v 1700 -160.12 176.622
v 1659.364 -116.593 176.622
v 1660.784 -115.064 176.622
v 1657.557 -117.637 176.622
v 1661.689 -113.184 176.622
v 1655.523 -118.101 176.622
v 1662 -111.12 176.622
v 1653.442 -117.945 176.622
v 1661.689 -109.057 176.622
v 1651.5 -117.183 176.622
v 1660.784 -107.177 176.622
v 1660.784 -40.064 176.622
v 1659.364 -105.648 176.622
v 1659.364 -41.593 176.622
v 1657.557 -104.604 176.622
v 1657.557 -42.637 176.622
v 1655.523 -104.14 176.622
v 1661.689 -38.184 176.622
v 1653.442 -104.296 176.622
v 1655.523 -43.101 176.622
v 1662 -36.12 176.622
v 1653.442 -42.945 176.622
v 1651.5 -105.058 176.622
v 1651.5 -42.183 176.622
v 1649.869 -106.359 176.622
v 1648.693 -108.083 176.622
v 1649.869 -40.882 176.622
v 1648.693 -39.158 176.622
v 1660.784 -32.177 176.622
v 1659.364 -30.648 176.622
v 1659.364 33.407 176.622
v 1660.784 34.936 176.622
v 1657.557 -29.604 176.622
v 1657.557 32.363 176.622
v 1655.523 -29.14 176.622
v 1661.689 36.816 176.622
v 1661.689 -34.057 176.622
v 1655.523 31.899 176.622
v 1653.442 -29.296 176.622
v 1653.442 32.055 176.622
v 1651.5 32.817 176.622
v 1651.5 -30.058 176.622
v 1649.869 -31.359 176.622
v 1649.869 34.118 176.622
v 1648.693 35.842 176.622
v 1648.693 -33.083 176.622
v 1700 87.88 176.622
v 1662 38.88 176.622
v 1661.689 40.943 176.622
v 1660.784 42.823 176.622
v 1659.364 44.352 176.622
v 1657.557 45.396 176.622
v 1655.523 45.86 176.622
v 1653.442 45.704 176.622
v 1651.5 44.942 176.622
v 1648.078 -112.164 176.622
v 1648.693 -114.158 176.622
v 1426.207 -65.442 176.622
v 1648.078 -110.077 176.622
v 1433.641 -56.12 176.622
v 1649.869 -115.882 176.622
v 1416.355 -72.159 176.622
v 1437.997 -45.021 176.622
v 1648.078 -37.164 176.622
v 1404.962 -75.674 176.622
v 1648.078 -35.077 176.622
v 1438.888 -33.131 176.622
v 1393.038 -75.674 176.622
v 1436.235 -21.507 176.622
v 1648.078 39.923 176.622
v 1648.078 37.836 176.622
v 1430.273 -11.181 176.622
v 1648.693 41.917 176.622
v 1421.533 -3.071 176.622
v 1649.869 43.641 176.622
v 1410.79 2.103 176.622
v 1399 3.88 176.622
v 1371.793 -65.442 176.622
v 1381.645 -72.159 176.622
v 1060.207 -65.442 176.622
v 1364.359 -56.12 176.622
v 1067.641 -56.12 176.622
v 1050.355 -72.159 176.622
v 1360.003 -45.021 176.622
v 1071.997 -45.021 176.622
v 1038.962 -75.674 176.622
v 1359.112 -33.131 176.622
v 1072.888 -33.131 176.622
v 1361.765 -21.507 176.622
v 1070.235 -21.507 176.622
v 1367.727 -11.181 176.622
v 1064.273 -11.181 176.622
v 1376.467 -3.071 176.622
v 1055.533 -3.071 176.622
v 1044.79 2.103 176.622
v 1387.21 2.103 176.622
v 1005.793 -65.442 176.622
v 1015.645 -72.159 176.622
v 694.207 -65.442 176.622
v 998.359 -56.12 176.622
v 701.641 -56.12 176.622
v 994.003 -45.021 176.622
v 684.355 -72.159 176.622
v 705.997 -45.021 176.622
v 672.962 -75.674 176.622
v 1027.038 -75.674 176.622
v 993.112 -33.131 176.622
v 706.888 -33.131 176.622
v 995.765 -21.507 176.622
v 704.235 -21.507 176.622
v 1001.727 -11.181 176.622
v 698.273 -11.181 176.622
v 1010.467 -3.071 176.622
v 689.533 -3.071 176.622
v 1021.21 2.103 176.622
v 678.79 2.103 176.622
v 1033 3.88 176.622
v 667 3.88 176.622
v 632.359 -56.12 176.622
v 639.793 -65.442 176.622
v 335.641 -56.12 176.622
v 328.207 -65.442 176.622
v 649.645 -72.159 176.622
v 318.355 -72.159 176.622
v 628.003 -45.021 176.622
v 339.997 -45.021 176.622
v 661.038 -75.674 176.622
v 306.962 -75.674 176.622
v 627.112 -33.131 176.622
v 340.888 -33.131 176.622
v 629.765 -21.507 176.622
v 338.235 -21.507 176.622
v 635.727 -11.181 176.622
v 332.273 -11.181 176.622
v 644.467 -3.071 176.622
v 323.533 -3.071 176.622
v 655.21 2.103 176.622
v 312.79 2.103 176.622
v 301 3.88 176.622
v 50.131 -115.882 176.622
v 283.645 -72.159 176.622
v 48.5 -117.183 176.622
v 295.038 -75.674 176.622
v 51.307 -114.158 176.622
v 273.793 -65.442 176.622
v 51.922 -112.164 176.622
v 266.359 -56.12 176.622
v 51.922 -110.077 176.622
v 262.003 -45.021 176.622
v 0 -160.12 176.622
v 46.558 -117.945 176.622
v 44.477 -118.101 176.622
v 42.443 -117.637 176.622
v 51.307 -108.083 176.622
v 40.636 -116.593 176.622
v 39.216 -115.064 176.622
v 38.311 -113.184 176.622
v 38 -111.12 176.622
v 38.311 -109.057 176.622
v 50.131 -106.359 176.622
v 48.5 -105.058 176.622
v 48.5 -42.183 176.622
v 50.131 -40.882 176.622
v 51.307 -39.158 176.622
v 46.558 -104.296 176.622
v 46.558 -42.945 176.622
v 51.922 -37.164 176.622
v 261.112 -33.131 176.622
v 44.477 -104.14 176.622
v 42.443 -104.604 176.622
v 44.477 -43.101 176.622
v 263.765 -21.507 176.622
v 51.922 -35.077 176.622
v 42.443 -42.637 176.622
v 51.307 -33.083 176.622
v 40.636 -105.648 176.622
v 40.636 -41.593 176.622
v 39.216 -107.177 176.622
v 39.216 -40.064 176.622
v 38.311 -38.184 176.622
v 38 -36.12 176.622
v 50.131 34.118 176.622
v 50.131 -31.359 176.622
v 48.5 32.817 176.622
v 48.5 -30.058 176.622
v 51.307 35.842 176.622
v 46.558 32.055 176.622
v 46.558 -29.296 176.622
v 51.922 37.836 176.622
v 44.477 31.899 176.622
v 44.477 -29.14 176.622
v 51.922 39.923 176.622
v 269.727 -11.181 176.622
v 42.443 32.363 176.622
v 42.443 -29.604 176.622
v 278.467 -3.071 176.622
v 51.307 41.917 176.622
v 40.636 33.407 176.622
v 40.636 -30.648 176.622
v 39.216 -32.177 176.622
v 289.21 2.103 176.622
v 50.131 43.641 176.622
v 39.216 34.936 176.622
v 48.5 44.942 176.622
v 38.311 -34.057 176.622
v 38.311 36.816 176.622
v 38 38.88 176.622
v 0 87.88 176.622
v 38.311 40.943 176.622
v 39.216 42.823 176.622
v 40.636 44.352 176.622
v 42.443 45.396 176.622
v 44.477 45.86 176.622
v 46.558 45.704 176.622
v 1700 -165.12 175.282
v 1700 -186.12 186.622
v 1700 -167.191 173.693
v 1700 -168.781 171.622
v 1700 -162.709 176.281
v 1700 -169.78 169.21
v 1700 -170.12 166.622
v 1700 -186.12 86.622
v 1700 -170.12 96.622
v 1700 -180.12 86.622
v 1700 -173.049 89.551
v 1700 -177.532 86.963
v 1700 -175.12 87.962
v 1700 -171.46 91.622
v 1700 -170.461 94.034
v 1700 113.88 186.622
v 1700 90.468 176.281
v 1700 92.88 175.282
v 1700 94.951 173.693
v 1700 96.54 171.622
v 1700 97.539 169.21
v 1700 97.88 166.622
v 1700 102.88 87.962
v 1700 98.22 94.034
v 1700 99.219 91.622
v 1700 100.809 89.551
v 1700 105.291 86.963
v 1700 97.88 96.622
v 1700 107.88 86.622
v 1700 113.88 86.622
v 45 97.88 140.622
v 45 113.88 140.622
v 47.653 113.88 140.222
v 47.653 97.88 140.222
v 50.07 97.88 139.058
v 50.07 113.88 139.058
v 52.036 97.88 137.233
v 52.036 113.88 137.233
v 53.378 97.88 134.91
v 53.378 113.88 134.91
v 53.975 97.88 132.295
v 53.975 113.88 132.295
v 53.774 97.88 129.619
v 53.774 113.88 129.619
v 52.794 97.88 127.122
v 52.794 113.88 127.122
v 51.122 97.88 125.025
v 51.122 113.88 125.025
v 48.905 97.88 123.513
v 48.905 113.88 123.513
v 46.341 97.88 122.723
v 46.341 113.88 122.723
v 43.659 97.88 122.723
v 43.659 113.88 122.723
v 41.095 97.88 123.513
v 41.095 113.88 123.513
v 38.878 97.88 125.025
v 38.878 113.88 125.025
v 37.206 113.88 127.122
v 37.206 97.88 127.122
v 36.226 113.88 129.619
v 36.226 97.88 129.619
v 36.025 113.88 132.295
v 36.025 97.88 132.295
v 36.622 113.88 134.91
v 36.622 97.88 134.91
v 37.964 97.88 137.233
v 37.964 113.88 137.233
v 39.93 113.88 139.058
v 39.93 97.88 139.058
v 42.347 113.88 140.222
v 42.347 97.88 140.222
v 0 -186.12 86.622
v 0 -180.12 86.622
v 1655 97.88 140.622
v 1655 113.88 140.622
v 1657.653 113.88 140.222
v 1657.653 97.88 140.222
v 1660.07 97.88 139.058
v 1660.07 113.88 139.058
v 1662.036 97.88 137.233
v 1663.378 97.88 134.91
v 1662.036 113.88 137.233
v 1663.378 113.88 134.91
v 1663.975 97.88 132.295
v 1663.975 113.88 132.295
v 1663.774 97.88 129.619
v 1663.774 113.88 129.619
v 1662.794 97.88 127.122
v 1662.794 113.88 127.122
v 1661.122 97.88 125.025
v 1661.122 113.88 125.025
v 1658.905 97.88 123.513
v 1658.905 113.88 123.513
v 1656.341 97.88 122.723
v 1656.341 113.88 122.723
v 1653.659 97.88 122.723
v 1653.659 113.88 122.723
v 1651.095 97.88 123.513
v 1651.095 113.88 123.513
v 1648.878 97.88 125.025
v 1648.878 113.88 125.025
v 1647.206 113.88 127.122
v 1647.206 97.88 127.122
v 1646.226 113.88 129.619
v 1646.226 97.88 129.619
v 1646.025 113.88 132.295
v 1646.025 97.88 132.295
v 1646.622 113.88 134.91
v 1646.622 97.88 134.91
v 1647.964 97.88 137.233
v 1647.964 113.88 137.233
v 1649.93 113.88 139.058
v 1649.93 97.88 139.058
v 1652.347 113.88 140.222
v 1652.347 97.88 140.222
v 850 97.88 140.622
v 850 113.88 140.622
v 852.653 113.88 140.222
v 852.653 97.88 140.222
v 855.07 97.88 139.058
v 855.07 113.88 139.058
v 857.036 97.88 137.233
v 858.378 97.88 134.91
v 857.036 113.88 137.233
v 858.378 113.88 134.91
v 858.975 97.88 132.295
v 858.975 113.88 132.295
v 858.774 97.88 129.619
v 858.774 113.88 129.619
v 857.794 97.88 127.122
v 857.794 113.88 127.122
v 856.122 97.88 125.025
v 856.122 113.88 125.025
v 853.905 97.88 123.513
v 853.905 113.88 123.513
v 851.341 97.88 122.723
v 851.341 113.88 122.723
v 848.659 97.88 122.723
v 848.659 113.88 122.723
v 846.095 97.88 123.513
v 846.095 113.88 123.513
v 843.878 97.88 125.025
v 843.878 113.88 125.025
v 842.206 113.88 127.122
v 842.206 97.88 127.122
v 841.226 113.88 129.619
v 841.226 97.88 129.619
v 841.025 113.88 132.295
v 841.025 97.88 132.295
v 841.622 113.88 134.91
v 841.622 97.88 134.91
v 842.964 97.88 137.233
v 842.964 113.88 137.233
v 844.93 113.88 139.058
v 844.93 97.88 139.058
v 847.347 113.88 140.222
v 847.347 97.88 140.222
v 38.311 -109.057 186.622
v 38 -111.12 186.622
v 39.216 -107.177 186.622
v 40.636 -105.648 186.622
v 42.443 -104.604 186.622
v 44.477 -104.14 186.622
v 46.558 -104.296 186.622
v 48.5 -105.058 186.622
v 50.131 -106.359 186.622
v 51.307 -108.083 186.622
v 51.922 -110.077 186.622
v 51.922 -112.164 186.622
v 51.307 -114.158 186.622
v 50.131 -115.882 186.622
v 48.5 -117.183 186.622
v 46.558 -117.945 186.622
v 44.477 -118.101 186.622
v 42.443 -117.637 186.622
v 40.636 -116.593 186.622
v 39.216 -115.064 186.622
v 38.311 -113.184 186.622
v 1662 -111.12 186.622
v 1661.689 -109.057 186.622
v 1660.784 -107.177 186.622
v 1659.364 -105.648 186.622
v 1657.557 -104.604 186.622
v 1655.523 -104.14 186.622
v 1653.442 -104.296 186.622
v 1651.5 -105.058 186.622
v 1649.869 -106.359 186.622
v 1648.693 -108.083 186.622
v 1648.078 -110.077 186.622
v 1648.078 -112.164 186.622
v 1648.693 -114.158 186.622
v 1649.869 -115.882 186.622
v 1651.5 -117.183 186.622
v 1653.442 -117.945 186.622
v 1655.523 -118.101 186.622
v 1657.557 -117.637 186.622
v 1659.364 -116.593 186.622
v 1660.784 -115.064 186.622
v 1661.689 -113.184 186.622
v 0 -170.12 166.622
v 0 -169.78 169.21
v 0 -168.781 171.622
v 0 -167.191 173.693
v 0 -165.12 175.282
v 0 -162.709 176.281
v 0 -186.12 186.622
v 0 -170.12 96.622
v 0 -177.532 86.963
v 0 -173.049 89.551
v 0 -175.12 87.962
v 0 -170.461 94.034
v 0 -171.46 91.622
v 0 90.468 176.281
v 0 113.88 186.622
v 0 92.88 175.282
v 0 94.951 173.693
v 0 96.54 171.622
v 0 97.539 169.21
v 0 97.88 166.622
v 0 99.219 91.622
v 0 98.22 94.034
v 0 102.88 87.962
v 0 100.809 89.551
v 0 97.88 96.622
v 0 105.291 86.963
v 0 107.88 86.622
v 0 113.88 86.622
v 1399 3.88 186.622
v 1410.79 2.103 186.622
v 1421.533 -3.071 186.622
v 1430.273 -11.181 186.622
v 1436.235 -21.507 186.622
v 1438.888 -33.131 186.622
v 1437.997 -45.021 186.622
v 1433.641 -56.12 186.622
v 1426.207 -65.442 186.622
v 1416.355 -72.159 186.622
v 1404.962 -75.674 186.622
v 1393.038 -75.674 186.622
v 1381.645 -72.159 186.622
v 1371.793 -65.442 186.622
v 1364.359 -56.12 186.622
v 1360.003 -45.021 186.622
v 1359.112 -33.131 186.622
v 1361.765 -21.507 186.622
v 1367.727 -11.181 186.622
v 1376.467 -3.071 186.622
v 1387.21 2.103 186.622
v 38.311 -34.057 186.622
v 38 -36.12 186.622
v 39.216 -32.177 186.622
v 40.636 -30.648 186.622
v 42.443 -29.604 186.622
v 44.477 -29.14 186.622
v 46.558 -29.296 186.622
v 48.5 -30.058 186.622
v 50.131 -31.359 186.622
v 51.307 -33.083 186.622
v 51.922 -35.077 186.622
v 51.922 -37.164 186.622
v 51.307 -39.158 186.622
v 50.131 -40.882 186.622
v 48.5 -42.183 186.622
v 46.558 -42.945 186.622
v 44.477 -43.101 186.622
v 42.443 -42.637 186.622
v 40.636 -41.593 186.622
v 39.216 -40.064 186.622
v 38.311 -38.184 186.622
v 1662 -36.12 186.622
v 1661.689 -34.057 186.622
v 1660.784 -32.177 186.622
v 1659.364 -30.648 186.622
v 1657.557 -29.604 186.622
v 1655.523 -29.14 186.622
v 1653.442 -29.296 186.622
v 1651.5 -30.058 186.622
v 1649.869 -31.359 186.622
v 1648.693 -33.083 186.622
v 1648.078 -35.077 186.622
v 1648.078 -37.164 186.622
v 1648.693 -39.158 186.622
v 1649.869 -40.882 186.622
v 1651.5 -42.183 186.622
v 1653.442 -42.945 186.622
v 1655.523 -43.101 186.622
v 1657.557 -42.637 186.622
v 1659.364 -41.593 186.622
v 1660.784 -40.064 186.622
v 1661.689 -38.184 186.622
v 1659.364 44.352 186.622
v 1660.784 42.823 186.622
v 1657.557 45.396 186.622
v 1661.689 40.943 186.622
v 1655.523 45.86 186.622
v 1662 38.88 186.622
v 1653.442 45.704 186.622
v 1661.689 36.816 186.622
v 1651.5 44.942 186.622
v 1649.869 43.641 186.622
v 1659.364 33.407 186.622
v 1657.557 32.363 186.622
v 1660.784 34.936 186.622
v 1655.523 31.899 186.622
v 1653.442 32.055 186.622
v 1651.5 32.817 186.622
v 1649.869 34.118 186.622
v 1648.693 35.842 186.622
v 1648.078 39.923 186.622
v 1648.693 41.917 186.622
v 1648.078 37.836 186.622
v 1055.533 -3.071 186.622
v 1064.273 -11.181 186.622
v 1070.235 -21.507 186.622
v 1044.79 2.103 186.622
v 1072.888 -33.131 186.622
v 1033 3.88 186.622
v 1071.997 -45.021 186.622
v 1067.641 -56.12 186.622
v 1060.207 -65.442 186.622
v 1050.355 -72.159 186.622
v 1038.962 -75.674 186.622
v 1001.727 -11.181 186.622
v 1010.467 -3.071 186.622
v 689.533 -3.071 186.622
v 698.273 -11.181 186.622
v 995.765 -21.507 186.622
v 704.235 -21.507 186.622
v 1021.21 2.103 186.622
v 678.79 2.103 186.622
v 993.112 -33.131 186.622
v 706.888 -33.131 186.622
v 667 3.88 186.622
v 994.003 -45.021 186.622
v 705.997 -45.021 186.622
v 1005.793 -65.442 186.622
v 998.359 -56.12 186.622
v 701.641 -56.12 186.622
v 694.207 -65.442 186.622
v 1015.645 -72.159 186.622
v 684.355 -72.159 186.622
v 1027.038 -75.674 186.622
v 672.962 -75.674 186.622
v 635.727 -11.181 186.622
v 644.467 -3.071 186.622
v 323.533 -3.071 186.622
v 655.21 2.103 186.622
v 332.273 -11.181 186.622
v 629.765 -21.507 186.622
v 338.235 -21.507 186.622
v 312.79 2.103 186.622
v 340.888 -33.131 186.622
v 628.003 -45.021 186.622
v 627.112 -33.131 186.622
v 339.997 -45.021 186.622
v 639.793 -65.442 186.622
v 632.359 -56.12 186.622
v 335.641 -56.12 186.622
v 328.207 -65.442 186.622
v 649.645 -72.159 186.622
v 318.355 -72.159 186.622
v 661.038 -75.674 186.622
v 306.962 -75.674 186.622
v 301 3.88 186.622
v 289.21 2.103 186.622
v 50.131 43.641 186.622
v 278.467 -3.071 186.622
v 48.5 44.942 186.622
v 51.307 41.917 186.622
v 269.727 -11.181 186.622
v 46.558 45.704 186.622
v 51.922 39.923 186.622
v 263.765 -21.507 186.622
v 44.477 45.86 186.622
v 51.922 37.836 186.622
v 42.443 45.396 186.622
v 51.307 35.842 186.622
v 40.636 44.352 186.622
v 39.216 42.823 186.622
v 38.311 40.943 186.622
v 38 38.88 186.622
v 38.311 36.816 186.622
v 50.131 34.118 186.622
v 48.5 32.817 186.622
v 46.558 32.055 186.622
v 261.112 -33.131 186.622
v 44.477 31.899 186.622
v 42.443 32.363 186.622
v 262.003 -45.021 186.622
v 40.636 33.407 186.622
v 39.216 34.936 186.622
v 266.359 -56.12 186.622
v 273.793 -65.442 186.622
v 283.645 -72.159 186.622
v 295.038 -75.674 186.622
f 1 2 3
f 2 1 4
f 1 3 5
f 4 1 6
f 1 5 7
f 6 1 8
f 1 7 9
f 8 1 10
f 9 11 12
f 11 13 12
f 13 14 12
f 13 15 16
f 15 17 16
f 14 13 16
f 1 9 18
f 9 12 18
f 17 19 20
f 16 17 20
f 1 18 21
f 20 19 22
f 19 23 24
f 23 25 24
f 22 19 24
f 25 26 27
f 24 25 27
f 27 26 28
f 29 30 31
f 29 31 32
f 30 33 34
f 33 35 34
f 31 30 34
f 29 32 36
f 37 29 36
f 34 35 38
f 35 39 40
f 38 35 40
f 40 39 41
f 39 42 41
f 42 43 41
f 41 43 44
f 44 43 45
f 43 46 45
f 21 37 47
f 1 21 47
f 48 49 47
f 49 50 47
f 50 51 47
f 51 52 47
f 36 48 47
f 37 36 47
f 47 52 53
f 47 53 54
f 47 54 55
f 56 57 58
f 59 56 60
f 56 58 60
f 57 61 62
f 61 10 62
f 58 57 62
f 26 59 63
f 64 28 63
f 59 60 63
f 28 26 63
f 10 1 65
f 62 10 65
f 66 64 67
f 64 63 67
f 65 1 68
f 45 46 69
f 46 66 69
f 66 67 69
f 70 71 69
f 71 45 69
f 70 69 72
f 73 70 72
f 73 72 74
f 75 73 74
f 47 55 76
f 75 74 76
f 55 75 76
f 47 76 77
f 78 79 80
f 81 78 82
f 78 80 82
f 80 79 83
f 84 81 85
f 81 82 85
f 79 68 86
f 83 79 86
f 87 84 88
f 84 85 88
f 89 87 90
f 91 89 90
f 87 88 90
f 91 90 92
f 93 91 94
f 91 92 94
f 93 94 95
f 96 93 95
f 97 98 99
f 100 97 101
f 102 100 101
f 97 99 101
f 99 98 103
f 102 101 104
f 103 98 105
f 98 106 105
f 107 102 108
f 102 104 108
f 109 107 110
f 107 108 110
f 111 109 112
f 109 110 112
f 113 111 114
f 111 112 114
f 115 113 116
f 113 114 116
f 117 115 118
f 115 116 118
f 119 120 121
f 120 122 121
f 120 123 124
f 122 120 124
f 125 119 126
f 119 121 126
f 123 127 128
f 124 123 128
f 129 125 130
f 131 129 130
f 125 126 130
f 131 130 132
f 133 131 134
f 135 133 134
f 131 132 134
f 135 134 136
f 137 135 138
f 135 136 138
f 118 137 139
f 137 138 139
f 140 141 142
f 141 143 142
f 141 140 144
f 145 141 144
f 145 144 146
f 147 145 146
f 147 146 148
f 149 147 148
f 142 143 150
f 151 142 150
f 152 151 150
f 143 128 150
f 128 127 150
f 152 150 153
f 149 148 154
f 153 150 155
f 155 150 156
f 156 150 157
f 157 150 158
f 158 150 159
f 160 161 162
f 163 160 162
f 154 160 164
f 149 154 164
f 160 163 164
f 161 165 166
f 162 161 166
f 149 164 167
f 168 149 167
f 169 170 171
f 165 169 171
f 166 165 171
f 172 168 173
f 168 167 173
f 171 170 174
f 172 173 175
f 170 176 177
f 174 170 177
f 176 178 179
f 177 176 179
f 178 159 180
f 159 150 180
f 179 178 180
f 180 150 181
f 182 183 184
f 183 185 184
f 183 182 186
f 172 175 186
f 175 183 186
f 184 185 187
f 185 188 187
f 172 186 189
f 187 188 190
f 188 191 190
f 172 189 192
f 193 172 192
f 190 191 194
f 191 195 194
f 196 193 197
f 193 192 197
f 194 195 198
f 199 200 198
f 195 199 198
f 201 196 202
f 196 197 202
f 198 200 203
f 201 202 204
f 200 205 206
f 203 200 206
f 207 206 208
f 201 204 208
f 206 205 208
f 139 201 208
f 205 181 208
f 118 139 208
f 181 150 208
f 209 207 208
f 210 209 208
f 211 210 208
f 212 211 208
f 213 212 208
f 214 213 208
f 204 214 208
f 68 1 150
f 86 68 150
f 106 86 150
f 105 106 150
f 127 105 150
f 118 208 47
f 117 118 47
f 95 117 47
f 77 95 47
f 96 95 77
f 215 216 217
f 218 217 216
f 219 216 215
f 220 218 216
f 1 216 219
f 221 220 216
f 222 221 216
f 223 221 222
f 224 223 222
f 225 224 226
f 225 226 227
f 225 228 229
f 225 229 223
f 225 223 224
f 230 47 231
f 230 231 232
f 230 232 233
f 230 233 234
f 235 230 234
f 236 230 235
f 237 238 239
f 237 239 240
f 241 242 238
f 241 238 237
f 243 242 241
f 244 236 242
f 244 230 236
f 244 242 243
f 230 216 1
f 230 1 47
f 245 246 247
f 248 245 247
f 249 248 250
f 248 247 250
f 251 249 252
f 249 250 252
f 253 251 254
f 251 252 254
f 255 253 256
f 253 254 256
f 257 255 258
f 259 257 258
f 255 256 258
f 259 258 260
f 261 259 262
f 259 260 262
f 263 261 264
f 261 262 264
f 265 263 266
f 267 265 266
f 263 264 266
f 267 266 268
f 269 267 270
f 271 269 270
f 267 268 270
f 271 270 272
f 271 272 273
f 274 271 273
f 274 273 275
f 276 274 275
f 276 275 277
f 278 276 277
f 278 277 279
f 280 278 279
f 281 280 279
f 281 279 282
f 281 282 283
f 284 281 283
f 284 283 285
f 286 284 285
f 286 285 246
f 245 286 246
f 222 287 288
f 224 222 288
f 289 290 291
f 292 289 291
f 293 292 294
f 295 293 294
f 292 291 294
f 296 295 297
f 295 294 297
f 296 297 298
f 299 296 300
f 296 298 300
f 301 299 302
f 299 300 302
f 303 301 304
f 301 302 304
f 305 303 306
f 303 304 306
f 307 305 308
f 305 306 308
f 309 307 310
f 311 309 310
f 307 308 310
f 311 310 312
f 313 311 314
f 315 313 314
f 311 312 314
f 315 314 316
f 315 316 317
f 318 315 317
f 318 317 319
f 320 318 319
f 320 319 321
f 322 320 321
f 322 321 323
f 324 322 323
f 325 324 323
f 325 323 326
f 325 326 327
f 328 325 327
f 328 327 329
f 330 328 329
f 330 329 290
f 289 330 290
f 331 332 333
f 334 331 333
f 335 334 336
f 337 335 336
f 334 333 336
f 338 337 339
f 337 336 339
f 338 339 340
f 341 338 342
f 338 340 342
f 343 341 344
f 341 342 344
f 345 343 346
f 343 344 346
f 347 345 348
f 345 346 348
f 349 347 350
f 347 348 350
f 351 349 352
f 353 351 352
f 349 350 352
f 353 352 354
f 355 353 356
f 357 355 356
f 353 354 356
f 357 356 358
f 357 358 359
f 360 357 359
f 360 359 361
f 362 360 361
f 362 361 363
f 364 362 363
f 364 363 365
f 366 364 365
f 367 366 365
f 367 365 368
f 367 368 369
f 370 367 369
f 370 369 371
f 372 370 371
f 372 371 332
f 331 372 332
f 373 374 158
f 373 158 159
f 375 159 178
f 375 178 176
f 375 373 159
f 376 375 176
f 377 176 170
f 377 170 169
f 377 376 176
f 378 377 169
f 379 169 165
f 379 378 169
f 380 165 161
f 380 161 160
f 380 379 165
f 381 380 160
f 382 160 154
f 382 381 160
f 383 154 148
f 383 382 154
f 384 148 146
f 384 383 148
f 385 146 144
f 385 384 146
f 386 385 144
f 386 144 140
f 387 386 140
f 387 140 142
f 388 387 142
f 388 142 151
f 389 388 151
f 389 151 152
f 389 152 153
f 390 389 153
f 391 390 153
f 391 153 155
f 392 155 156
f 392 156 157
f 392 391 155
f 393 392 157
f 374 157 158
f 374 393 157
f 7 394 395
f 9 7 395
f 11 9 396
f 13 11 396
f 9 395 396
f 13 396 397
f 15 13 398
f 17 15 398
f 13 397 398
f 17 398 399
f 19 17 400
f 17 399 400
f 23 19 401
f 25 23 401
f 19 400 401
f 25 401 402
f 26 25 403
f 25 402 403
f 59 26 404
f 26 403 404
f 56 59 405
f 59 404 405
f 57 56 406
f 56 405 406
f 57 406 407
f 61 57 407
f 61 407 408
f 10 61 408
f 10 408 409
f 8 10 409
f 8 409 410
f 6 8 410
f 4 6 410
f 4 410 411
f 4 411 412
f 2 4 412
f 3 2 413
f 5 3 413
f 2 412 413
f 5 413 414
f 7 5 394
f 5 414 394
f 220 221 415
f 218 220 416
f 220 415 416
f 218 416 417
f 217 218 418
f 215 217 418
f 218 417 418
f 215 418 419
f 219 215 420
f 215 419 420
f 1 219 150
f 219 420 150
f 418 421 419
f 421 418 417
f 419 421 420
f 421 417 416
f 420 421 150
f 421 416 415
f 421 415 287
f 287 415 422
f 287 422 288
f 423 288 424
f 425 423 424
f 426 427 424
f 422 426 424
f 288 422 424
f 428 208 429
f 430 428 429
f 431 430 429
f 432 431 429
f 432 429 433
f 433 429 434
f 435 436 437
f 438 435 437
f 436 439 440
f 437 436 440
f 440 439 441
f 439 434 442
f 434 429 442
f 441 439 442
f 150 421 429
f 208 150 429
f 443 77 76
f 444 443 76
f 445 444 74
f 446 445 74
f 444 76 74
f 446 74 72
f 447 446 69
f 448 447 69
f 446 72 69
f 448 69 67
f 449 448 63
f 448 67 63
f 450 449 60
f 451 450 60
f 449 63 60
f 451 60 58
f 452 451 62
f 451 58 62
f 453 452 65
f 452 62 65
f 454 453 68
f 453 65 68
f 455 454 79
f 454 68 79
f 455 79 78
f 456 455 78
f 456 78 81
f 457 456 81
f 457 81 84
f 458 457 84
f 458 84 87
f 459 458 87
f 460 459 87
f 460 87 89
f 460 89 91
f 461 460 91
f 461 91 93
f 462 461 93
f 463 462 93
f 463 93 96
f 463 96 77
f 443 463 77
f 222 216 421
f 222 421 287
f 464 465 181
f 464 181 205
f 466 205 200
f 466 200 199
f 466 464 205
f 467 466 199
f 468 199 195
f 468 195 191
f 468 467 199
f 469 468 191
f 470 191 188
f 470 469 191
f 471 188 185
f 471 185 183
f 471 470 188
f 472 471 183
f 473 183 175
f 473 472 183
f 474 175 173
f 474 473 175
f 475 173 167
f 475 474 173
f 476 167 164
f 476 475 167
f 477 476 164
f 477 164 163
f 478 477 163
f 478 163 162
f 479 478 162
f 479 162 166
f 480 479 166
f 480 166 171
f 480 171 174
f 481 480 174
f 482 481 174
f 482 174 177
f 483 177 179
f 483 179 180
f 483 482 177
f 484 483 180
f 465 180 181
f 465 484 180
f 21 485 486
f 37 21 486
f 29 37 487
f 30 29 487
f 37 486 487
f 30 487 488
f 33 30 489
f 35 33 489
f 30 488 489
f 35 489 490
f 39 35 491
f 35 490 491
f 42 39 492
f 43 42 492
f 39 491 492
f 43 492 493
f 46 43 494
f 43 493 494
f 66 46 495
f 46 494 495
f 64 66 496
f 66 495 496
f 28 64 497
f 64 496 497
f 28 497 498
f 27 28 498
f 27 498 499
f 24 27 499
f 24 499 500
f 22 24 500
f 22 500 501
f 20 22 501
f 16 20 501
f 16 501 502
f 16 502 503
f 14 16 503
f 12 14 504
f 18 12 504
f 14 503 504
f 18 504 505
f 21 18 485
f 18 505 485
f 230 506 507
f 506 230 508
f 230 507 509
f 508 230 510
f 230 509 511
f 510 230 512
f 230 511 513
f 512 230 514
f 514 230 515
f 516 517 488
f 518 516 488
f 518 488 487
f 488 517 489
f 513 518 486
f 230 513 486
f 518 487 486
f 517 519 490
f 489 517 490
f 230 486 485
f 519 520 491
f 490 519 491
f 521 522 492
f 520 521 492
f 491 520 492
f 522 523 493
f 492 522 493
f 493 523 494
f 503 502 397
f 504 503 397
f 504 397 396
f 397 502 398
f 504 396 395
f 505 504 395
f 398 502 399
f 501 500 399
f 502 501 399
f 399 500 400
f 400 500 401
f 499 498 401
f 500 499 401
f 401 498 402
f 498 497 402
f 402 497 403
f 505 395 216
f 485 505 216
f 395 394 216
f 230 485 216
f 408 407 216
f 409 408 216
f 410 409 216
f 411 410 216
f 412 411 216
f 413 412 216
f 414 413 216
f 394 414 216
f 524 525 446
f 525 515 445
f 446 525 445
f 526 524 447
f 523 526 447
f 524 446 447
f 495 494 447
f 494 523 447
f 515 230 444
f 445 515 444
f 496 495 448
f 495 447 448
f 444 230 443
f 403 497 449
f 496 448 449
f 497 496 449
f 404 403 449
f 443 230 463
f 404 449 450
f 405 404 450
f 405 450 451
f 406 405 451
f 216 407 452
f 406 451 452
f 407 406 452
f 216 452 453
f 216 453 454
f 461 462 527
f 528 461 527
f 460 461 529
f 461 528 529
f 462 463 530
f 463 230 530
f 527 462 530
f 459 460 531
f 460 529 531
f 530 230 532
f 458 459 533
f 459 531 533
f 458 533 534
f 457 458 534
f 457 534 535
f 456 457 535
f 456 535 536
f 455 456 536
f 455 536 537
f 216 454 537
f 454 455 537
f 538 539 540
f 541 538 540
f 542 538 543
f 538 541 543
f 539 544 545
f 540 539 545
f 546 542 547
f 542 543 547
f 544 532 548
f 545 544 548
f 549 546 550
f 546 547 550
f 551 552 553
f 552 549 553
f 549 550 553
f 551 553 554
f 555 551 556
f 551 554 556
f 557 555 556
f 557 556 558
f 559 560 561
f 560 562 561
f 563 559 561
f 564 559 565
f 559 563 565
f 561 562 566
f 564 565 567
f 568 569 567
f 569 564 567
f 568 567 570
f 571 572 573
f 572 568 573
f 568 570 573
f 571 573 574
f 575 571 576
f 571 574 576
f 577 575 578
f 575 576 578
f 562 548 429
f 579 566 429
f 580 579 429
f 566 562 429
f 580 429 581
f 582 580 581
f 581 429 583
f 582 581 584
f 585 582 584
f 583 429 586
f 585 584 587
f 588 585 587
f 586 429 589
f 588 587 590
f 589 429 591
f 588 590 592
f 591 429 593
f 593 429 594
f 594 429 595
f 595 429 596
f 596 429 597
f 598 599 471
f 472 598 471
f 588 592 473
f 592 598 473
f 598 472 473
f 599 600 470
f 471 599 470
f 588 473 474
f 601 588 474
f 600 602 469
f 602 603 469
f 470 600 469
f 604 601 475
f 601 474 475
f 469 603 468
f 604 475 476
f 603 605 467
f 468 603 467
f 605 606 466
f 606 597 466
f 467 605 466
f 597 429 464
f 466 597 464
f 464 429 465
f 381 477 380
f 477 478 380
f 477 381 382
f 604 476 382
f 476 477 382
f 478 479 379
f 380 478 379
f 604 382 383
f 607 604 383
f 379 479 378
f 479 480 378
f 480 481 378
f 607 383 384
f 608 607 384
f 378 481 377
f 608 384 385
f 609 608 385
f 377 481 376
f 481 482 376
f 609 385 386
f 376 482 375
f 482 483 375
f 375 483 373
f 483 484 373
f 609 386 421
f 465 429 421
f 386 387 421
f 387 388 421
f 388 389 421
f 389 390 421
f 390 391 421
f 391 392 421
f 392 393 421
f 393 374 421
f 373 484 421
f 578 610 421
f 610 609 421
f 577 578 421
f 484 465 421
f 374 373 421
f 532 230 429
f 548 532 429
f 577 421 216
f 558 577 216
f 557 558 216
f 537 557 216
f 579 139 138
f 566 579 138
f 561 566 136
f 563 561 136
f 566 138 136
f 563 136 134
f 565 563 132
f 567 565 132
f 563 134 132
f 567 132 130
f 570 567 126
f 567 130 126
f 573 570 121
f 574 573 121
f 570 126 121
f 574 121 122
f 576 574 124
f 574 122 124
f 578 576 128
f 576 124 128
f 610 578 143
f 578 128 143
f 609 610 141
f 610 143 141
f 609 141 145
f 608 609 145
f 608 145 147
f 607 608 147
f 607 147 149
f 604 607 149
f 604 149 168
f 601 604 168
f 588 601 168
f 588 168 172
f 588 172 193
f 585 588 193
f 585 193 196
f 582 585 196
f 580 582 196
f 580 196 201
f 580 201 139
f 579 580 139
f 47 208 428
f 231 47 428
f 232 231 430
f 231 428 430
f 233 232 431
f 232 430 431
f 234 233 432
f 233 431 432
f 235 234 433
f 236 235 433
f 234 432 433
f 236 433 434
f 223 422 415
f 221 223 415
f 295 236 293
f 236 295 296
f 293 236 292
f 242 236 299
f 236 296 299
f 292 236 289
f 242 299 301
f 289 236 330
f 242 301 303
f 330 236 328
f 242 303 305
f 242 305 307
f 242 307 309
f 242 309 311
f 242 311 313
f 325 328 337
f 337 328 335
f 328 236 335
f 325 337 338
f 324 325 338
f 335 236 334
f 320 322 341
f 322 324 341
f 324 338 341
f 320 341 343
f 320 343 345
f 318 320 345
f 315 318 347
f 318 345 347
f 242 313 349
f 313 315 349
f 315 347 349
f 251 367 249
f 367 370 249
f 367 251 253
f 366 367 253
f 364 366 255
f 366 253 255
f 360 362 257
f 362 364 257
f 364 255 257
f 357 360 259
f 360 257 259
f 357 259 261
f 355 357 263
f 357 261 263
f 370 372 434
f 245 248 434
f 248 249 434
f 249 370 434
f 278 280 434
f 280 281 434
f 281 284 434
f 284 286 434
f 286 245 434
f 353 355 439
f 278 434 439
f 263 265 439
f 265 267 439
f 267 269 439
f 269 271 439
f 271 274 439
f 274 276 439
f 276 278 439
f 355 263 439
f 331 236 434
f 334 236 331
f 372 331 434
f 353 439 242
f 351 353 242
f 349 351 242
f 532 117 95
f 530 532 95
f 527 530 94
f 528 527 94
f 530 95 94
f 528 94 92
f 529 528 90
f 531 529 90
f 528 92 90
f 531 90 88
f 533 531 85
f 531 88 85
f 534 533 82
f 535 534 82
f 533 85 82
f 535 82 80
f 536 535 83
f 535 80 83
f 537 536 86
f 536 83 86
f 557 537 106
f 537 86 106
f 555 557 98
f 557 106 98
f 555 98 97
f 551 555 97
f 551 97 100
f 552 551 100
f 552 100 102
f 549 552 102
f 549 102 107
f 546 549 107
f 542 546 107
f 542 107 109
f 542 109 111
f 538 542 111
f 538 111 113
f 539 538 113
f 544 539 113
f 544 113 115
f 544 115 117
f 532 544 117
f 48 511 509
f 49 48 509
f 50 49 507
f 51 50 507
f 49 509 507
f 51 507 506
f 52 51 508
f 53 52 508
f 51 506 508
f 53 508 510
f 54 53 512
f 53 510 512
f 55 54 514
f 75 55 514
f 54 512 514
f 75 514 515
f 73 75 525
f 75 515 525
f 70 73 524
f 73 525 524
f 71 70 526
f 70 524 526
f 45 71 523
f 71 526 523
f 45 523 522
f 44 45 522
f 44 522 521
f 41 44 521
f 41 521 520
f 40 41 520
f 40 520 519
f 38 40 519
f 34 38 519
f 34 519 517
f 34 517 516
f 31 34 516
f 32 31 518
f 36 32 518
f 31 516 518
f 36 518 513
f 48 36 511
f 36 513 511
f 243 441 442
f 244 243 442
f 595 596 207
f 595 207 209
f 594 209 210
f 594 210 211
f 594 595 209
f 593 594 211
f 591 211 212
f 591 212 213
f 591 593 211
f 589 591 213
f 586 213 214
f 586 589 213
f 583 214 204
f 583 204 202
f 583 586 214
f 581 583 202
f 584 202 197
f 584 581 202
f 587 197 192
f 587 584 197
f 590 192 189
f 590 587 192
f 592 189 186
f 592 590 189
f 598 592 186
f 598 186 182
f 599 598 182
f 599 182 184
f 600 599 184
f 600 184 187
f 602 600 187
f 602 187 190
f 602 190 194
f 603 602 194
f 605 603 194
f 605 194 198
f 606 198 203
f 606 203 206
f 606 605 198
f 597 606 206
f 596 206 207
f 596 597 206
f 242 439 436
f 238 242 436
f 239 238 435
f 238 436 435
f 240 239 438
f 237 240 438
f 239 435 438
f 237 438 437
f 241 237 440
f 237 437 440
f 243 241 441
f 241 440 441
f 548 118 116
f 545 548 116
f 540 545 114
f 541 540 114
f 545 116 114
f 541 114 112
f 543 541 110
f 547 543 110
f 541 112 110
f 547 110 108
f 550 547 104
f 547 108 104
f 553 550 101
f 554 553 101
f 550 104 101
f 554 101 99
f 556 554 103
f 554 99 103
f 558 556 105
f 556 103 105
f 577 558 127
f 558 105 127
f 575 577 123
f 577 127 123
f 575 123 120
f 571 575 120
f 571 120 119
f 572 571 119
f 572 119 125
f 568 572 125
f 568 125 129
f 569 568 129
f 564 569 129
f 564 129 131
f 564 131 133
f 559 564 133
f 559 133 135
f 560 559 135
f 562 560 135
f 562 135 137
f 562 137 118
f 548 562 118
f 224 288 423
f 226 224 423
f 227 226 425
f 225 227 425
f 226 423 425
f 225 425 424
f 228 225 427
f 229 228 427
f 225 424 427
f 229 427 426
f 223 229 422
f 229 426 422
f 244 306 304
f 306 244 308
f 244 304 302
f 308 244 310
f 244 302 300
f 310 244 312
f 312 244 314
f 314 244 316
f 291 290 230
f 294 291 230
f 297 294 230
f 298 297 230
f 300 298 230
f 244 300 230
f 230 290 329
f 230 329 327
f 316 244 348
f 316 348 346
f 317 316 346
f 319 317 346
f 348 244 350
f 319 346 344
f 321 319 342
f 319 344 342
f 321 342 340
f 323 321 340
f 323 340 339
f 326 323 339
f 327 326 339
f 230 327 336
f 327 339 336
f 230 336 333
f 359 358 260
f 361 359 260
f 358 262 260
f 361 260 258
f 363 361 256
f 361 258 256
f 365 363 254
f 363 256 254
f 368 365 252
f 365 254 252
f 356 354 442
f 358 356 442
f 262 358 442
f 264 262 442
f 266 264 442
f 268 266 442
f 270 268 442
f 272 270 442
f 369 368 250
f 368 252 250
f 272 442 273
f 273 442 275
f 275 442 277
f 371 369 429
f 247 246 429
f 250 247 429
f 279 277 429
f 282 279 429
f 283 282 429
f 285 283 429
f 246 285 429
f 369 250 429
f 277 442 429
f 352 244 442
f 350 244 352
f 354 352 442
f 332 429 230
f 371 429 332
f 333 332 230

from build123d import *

# Parameters (mm, degrees)
BOSS_EXTRUDE1_DEPTH = 1700
SKETCH3_R           = 7
CUT_EXTRUDE1_DEPTH  = 10
SKETCH4_R           = 9
CUT_EXTRUDE2_DEPTH  = 20
LPATTERN1_COUNT     = 3
LPATTERN1_PITCH     = 805
SKETCH5_R           = 40
CUT_EXTRUDE3_DEPTH  = 30
LPATTERN2_COUNT     = 4
LPATTERN2_PITCH     = 366


with BuildPart() as part:
    # Sketch1 → Boss-Extrude1 (new body)
    with BuildSketch(Plane(origin=(0, 0, 0), x_dir=(0, 0, -1), z_dir=(1, 0, 0))):
        with BuildLine():
            Line((-86.622073579, 113.879598662), (-186.622073579, 113.879598662))
            Line((-186.622073579, 113.879598662), (-186.622073579, -186.120401338))
            Line((-186.622073579, -186.120401338), (-86.622073579, -186.120401338))
            Line((-86.622073579, -186.120401338), (-86.622073579, -180.120401338))
            ThreePointArc((-86.622073579, -180.120401338), (-89.551005767, -173.049333526), (-96.622073579, -170.120401338))
            Line((-96.622073579, -170.120401338), (-166.622073579, -170.120401338))
            ThreePointArc((-166.622073579, -170.120401338), (-173.69314139, -167.19146915), (-176.622073579, -160.120401338))
            Line((-176.622073579, -160.120401338), (-176.622073579, 87.879598662))
            ThreePointArc((-176.622073579, 87.879598662), (-173.69314139, 94.950666474), (-166.622073579, 97.879598662))
            Line((-166.622073579, 97.879598662), (-96.622073579, 97.879598662))
            ThreePointArc((-96.622073579, 97.879598662), (-89.551005767, 100.80853085), (-86.622073579, 107.879598662))
            Line((-86.622073579, 107.879598662), (-86.622073579, 113.879598662))
        make_face()
    extrude(amount=BOSS_EXTRUDE1_DEPTH)

    # Sketch3 → Cut-Extrude1 (cut)
    with BuildSketch(Plane.XY.offset(186.622073579)):
        with Locations((1655, 38.879598662)):
            Circle(SKETCH3_R)
        with Locations((1655, -36.120401338)):
            Circle(SKETCH3_R)
        with Locations((1655, -111.120401338)):
            Circle(SKETCH3_R)
    cut_extrude1 = extrude(amount=-CUT_EXTRUDE1_DEPTH, mode=Mode.SUBTRACT)

    # Mirror1: Cut-Extrude1 across plane
    add(cut_extrude1.mirror(Plane(origin=(850, 0, 0), x_dir=(0, 0, 1), z_dir=(1, 0, 0))), mode=Mode.SUBTRACT)

    # Sketch4 → Cut-Extrude2 (cut)
    with BuildSketch(Plane(origin=(0, 113.879598662, 0), x_dir=(1, 0, 0), z_dir=(0, 1, 0))):
        with Locations(Location((45, -131.622073579, 0), (0, 0, 270))):
            Circle(SKETCH4_R)
    cut_extrude2 = extrude(amount=-CUT_EXTRUDE2_DEPTH, mode=Mode.SUBTRACT)

    # LPattern1: Cut-Extrude2 ×3
    with Locations(*[(i * LPATTERN1_PITCH, 0, 0) for i in range(1, LPATTERN1_COUNT)]):
        add(cut_extrude2, mode=Mode.SUBTRACT)

    # Sketch5 → Cut-Extrude3 (cut)
    with BuildSketch(Plane(origin=(0, 0, 176.622073579), x_dir=(-1, 0, 0), z_dir=(0, 0, -1))):
        with Locations(Location((-1399, -36.120401338, 0), (0, 0, 90))):
            Circle(SKETCH5_R)
    cut_extrude3 = extrude(amount=-CUT_EXTRUDE3_DEPTH, mode=Mode.SUBTRACT)

    # LPattern2: Cut-Extrude3 ×4
    with Locations(*[(-i * LPATTERN2_PITCH, 0, 0) for i in range(1, LPATTERN2_COUNT)]):
        add(cut_extrude3, mode=Mode.SUBTRACT)


solid = part.part
